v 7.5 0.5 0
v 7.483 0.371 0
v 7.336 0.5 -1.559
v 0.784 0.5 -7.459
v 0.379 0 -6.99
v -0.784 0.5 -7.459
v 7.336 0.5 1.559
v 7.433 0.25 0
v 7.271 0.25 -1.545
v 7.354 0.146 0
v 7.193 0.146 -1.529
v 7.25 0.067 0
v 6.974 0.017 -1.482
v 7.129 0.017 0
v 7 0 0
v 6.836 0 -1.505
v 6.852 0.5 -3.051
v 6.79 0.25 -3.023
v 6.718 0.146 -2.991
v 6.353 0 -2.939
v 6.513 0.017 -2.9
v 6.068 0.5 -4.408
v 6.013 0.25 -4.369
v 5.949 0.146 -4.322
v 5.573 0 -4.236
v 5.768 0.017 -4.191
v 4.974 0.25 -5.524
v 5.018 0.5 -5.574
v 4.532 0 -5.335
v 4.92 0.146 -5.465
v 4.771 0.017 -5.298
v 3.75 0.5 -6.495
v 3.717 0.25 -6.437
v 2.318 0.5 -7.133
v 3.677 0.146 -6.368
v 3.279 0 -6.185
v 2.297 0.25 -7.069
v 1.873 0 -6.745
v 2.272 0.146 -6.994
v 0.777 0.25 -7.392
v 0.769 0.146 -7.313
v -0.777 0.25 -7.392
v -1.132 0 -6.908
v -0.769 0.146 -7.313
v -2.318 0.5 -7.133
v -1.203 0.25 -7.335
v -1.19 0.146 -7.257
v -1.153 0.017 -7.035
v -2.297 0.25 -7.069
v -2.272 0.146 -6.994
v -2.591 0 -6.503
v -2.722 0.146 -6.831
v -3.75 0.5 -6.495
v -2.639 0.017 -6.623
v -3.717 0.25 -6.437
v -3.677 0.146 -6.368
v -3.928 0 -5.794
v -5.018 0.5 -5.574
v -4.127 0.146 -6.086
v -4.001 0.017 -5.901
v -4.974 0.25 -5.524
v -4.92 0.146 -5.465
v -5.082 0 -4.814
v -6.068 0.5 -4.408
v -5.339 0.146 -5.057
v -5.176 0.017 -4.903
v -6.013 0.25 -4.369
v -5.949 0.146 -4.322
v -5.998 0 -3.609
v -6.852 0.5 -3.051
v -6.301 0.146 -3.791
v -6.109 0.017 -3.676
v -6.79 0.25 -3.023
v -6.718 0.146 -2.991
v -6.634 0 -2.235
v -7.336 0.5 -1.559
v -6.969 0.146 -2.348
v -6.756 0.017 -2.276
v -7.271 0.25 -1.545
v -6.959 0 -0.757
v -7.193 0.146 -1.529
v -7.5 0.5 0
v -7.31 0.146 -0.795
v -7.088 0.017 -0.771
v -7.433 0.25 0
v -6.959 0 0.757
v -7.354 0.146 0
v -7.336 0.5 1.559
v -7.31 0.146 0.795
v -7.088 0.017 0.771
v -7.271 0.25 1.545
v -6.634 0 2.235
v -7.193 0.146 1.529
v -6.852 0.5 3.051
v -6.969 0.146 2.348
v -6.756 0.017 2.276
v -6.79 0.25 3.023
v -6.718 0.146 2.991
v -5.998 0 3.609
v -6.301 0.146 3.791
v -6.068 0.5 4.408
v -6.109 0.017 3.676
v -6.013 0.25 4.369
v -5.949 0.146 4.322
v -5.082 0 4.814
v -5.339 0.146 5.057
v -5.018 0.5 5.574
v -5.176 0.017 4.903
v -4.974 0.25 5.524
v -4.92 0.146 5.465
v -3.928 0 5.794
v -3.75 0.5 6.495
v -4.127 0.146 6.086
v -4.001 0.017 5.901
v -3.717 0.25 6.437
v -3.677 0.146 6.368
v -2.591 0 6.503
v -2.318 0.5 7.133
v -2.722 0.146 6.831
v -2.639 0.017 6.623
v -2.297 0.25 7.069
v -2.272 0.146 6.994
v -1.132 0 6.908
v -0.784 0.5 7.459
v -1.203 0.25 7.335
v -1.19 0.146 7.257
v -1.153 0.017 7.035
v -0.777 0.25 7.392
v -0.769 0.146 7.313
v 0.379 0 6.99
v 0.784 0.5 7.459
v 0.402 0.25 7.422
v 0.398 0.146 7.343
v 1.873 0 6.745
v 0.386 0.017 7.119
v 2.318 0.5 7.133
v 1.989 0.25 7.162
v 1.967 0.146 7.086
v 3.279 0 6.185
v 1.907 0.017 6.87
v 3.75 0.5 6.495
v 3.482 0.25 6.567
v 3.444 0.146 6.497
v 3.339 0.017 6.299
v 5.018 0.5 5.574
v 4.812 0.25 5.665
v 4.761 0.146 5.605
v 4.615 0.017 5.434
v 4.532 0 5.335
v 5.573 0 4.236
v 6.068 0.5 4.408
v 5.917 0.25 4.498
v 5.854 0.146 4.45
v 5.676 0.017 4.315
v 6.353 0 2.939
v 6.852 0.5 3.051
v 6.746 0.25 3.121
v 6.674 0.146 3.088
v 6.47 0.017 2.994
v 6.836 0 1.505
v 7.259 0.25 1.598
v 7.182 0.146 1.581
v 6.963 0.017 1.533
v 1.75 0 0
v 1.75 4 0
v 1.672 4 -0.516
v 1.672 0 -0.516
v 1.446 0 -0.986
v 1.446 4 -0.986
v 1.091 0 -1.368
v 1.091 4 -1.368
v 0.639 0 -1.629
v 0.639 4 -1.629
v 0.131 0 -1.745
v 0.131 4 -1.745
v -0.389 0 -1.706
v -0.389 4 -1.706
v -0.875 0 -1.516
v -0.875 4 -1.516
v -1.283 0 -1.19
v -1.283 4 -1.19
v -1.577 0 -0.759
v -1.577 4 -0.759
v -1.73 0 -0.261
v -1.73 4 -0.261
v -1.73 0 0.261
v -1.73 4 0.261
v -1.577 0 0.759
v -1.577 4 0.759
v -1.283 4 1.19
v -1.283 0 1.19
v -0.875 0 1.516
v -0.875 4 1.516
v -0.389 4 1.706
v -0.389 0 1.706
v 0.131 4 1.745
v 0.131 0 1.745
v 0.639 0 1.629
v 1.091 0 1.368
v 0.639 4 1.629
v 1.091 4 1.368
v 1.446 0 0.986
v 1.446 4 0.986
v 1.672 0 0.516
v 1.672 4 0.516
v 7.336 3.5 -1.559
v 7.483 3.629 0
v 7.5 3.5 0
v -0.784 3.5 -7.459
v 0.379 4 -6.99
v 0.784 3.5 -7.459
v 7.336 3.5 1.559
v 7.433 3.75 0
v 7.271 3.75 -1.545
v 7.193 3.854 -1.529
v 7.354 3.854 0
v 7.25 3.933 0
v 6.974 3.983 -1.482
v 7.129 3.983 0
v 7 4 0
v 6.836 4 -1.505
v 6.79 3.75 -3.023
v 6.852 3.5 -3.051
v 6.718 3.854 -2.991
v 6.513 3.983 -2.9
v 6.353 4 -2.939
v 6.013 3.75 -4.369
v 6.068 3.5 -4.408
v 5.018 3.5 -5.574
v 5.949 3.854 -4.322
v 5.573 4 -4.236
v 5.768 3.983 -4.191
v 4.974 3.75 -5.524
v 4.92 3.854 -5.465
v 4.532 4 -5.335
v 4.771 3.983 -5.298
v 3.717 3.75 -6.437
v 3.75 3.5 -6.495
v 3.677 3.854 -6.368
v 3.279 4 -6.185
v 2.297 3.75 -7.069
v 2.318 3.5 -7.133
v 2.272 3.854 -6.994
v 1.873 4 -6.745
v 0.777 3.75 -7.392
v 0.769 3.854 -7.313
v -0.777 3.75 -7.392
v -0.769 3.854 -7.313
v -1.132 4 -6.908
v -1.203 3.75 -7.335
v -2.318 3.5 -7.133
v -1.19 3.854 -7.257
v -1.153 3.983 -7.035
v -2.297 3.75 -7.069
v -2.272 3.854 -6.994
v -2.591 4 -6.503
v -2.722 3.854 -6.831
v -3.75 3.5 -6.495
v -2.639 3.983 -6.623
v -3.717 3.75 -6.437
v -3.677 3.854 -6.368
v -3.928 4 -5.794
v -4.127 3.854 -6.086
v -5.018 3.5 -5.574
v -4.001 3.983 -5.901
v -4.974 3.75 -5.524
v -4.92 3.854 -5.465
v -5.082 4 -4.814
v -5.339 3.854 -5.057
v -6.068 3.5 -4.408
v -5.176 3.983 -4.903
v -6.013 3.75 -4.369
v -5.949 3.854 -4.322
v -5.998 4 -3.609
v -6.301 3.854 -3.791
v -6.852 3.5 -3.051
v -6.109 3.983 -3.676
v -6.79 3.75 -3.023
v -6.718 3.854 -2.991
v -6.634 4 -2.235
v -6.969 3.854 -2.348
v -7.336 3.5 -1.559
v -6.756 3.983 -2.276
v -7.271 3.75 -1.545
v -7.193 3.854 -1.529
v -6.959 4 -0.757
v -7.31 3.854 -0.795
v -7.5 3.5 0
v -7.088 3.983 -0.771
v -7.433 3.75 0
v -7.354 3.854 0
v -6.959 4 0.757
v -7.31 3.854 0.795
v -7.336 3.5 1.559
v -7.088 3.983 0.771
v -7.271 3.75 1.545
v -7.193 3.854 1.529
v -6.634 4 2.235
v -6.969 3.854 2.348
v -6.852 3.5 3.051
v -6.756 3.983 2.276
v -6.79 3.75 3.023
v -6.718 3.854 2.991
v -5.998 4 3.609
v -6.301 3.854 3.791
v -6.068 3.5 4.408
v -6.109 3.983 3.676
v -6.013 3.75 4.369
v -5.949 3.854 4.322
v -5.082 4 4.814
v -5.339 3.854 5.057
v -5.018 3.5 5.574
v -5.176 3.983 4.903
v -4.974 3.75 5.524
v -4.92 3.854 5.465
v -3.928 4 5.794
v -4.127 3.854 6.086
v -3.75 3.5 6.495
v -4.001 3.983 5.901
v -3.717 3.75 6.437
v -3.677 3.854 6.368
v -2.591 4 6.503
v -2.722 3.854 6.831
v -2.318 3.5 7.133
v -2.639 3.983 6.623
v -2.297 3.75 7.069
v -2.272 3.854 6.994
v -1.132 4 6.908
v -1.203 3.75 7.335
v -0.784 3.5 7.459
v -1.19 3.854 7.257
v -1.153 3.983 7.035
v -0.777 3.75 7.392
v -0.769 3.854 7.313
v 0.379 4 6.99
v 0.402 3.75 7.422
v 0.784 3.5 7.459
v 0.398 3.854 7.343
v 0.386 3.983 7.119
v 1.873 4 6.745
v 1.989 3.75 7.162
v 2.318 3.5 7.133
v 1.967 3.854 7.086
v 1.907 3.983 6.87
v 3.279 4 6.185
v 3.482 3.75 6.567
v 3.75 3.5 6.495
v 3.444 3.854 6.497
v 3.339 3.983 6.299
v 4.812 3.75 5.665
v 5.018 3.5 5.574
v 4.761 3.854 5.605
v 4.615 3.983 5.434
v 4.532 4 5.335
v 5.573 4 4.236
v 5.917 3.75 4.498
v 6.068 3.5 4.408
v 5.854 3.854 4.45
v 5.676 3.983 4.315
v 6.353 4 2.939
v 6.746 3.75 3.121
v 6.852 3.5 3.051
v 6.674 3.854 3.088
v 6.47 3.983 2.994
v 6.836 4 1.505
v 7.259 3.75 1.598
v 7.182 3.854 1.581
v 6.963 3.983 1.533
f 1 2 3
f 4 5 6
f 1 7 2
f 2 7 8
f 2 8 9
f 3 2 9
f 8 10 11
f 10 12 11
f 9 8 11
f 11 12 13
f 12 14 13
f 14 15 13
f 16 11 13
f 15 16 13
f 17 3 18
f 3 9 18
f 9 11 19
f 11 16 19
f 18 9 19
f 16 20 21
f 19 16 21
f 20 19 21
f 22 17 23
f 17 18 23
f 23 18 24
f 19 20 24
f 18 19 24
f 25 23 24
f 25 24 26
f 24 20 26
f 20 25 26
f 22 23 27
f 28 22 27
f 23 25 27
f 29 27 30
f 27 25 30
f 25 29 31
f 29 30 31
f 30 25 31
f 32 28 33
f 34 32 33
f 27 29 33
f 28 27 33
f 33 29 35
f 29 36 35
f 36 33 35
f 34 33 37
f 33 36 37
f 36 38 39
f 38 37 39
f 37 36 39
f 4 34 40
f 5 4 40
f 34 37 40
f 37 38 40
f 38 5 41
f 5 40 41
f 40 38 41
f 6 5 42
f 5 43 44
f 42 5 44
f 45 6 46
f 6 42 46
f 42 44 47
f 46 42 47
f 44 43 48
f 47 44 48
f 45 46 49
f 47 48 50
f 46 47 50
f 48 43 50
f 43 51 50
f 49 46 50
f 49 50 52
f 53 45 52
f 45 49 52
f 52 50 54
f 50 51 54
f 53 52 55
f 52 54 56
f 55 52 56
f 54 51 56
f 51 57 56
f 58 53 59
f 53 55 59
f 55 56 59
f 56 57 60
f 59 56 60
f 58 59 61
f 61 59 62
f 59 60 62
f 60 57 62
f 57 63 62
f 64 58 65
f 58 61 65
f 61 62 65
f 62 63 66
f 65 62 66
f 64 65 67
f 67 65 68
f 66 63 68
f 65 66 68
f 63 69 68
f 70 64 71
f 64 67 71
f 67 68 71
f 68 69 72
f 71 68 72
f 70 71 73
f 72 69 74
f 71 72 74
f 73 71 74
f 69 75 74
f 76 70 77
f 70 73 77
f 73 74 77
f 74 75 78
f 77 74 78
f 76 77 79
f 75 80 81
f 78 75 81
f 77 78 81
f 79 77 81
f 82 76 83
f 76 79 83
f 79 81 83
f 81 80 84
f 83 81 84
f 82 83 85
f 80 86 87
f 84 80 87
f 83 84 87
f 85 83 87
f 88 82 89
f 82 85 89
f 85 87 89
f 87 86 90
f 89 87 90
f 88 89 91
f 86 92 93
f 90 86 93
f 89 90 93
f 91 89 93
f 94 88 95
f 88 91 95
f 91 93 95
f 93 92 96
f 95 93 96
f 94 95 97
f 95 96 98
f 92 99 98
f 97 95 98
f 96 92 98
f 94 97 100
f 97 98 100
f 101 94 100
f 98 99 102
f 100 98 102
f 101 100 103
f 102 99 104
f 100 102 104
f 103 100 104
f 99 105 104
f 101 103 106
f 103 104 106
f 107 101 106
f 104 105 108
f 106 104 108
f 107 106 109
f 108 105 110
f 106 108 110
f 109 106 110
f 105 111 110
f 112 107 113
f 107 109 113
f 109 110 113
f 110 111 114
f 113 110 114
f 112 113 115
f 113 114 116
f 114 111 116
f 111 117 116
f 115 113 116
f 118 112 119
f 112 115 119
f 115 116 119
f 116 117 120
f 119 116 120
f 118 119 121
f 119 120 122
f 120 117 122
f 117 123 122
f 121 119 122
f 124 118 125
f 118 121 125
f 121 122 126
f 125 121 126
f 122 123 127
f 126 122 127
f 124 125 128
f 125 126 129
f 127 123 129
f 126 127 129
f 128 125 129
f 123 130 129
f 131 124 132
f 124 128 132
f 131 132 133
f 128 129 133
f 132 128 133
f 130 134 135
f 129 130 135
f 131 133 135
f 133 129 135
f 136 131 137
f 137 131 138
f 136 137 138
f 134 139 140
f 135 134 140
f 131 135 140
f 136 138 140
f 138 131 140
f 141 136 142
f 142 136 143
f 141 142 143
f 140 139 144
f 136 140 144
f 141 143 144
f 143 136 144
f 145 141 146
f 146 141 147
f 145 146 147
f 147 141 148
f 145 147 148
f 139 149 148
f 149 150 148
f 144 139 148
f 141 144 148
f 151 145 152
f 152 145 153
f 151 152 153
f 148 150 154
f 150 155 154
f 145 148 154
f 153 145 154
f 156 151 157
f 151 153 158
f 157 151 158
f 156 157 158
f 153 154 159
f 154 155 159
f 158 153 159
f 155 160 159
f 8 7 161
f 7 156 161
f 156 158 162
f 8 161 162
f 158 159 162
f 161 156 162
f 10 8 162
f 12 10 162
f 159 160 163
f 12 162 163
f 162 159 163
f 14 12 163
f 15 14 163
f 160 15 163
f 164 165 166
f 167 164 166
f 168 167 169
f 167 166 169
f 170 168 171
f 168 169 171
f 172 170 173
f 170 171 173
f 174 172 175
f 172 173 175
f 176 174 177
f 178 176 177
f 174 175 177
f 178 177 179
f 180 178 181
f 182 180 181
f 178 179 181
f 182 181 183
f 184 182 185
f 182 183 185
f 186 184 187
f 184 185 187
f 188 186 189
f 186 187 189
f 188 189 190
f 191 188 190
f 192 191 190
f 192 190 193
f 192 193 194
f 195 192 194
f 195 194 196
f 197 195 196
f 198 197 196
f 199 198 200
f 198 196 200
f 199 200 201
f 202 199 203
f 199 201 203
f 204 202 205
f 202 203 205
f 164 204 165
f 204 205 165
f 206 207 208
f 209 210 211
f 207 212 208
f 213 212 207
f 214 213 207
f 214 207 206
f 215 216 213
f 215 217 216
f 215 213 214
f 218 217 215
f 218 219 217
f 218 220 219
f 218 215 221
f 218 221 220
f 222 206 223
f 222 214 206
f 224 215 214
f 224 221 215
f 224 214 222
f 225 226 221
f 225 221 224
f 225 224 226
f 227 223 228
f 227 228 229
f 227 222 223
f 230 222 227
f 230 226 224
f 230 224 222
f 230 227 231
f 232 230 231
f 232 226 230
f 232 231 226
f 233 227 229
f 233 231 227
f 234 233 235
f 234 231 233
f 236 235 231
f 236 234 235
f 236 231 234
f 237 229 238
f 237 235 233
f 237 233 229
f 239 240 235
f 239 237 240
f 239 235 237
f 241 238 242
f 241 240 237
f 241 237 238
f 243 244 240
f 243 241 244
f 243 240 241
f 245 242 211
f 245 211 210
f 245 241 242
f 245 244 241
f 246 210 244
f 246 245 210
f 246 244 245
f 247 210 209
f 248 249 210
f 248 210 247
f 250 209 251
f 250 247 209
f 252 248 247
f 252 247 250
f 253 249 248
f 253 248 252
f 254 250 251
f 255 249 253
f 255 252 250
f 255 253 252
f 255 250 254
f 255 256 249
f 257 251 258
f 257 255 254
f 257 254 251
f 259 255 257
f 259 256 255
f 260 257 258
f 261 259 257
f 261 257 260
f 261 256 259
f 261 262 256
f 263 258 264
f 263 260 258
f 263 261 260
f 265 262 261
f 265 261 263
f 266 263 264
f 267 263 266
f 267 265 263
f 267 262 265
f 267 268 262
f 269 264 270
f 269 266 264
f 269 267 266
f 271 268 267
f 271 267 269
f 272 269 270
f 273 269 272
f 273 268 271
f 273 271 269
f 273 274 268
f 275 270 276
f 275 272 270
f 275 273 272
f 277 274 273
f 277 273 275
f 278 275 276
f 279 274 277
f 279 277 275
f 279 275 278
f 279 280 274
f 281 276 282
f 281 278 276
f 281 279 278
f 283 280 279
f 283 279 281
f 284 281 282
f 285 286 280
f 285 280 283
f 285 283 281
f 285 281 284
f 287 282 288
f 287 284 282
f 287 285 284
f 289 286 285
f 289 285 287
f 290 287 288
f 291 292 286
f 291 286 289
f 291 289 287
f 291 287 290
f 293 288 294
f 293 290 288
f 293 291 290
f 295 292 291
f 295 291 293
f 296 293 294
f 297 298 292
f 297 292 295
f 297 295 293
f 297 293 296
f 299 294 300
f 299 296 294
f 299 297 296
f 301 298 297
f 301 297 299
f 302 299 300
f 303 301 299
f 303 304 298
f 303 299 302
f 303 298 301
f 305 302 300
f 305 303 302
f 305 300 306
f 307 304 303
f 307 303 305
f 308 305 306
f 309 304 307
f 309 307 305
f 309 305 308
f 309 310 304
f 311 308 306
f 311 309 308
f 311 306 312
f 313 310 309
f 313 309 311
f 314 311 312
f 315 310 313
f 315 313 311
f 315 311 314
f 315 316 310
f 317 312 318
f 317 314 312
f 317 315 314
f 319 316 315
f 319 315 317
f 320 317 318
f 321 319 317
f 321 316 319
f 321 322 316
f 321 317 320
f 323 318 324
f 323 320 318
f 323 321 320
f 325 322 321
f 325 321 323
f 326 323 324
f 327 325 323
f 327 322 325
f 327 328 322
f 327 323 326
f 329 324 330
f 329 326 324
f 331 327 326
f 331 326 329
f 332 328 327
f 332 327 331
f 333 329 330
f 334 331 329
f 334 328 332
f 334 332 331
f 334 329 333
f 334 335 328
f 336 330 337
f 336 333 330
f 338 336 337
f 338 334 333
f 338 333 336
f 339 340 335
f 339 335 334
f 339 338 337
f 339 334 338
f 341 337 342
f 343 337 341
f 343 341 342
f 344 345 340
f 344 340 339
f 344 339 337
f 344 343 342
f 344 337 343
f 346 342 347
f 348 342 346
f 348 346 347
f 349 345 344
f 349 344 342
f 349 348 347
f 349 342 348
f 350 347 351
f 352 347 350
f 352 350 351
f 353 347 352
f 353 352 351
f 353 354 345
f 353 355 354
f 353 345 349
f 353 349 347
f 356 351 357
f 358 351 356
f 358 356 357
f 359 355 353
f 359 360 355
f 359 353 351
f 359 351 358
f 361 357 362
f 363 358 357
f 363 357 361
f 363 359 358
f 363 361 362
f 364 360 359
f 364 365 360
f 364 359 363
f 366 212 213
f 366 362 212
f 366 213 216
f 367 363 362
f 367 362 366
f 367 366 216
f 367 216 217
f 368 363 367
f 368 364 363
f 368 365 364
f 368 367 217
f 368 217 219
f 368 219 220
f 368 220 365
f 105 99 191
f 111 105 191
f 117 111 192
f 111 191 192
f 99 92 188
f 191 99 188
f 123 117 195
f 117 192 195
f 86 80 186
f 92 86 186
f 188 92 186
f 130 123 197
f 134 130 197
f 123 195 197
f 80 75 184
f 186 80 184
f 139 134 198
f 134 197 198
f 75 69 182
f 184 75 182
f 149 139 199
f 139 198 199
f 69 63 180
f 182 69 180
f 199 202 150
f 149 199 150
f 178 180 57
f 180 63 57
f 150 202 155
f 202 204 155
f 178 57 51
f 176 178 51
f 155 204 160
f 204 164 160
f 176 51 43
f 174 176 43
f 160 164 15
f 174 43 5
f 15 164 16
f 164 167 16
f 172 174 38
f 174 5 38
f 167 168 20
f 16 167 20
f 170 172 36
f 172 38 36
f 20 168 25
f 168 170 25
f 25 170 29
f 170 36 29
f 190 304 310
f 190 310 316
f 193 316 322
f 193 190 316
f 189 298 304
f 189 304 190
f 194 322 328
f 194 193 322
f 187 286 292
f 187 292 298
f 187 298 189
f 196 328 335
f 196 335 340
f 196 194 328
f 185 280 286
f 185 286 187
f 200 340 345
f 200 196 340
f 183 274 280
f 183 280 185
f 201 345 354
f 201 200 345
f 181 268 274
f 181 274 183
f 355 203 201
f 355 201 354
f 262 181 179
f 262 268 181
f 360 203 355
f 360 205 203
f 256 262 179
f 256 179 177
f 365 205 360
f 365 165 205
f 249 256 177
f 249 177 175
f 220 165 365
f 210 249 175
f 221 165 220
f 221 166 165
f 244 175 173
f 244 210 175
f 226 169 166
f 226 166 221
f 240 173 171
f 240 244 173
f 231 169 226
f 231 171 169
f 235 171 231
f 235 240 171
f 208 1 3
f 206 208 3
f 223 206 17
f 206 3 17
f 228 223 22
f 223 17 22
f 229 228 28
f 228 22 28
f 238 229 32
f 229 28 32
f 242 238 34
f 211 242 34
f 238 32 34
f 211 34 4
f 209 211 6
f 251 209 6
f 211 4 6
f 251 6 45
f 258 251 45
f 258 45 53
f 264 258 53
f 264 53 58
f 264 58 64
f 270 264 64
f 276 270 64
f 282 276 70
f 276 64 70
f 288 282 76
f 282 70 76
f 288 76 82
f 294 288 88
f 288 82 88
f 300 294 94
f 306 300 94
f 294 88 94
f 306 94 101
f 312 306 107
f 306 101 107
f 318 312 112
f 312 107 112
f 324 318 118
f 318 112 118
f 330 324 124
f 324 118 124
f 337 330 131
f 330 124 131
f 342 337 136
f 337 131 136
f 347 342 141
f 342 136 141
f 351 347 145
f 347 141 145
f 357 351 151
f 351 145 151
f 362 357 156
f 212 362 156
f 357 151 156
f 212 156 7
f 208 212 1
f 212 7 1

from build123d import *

# Parameters (mm, degrees)
SKETCH1_R           = 7.5
BOSS_EXTRUDE1_DEPTH = 4
SKETCH2_R           = 1.75
CUT_EXTRUDE1_DEPTH  = 4
FILLET1_R           = 0.5


with BuildPart() as part:
    # Sketch1 → Boss-Extrude1 (new body)
    with BuildSketch(Plane(origin=(0, 0, 0), x_dir=(1, 0, 0), z_dir=(0, 1, 0))):
        Circle(SKETCH1_R)
    extrude(amount=BOSS_EXTRUDE1_DEPTH)

    # Sketch2 → Cut-Extrude1 (cut)
    with BuildSketch(Plane(origin=(0, 4, 0), x_dir=(1, 0, 0), z_dir=(0, 1, 0))):
        Circle(SKETCH2_R)
    extrude(amount=-CUT_EXTRUDE1_DEPTH, mode=Mode.SUBTRACT)

    # Fillet1
    fillet1_edges = [part.edges().sort_by_distance(p)[0] for p in [
        (-7.5, 0, 0),
        (-7.5, 4, 0),
    ]]
    fillet(fillet1_edges, radius=FILLET1_R)


solid = part.part
